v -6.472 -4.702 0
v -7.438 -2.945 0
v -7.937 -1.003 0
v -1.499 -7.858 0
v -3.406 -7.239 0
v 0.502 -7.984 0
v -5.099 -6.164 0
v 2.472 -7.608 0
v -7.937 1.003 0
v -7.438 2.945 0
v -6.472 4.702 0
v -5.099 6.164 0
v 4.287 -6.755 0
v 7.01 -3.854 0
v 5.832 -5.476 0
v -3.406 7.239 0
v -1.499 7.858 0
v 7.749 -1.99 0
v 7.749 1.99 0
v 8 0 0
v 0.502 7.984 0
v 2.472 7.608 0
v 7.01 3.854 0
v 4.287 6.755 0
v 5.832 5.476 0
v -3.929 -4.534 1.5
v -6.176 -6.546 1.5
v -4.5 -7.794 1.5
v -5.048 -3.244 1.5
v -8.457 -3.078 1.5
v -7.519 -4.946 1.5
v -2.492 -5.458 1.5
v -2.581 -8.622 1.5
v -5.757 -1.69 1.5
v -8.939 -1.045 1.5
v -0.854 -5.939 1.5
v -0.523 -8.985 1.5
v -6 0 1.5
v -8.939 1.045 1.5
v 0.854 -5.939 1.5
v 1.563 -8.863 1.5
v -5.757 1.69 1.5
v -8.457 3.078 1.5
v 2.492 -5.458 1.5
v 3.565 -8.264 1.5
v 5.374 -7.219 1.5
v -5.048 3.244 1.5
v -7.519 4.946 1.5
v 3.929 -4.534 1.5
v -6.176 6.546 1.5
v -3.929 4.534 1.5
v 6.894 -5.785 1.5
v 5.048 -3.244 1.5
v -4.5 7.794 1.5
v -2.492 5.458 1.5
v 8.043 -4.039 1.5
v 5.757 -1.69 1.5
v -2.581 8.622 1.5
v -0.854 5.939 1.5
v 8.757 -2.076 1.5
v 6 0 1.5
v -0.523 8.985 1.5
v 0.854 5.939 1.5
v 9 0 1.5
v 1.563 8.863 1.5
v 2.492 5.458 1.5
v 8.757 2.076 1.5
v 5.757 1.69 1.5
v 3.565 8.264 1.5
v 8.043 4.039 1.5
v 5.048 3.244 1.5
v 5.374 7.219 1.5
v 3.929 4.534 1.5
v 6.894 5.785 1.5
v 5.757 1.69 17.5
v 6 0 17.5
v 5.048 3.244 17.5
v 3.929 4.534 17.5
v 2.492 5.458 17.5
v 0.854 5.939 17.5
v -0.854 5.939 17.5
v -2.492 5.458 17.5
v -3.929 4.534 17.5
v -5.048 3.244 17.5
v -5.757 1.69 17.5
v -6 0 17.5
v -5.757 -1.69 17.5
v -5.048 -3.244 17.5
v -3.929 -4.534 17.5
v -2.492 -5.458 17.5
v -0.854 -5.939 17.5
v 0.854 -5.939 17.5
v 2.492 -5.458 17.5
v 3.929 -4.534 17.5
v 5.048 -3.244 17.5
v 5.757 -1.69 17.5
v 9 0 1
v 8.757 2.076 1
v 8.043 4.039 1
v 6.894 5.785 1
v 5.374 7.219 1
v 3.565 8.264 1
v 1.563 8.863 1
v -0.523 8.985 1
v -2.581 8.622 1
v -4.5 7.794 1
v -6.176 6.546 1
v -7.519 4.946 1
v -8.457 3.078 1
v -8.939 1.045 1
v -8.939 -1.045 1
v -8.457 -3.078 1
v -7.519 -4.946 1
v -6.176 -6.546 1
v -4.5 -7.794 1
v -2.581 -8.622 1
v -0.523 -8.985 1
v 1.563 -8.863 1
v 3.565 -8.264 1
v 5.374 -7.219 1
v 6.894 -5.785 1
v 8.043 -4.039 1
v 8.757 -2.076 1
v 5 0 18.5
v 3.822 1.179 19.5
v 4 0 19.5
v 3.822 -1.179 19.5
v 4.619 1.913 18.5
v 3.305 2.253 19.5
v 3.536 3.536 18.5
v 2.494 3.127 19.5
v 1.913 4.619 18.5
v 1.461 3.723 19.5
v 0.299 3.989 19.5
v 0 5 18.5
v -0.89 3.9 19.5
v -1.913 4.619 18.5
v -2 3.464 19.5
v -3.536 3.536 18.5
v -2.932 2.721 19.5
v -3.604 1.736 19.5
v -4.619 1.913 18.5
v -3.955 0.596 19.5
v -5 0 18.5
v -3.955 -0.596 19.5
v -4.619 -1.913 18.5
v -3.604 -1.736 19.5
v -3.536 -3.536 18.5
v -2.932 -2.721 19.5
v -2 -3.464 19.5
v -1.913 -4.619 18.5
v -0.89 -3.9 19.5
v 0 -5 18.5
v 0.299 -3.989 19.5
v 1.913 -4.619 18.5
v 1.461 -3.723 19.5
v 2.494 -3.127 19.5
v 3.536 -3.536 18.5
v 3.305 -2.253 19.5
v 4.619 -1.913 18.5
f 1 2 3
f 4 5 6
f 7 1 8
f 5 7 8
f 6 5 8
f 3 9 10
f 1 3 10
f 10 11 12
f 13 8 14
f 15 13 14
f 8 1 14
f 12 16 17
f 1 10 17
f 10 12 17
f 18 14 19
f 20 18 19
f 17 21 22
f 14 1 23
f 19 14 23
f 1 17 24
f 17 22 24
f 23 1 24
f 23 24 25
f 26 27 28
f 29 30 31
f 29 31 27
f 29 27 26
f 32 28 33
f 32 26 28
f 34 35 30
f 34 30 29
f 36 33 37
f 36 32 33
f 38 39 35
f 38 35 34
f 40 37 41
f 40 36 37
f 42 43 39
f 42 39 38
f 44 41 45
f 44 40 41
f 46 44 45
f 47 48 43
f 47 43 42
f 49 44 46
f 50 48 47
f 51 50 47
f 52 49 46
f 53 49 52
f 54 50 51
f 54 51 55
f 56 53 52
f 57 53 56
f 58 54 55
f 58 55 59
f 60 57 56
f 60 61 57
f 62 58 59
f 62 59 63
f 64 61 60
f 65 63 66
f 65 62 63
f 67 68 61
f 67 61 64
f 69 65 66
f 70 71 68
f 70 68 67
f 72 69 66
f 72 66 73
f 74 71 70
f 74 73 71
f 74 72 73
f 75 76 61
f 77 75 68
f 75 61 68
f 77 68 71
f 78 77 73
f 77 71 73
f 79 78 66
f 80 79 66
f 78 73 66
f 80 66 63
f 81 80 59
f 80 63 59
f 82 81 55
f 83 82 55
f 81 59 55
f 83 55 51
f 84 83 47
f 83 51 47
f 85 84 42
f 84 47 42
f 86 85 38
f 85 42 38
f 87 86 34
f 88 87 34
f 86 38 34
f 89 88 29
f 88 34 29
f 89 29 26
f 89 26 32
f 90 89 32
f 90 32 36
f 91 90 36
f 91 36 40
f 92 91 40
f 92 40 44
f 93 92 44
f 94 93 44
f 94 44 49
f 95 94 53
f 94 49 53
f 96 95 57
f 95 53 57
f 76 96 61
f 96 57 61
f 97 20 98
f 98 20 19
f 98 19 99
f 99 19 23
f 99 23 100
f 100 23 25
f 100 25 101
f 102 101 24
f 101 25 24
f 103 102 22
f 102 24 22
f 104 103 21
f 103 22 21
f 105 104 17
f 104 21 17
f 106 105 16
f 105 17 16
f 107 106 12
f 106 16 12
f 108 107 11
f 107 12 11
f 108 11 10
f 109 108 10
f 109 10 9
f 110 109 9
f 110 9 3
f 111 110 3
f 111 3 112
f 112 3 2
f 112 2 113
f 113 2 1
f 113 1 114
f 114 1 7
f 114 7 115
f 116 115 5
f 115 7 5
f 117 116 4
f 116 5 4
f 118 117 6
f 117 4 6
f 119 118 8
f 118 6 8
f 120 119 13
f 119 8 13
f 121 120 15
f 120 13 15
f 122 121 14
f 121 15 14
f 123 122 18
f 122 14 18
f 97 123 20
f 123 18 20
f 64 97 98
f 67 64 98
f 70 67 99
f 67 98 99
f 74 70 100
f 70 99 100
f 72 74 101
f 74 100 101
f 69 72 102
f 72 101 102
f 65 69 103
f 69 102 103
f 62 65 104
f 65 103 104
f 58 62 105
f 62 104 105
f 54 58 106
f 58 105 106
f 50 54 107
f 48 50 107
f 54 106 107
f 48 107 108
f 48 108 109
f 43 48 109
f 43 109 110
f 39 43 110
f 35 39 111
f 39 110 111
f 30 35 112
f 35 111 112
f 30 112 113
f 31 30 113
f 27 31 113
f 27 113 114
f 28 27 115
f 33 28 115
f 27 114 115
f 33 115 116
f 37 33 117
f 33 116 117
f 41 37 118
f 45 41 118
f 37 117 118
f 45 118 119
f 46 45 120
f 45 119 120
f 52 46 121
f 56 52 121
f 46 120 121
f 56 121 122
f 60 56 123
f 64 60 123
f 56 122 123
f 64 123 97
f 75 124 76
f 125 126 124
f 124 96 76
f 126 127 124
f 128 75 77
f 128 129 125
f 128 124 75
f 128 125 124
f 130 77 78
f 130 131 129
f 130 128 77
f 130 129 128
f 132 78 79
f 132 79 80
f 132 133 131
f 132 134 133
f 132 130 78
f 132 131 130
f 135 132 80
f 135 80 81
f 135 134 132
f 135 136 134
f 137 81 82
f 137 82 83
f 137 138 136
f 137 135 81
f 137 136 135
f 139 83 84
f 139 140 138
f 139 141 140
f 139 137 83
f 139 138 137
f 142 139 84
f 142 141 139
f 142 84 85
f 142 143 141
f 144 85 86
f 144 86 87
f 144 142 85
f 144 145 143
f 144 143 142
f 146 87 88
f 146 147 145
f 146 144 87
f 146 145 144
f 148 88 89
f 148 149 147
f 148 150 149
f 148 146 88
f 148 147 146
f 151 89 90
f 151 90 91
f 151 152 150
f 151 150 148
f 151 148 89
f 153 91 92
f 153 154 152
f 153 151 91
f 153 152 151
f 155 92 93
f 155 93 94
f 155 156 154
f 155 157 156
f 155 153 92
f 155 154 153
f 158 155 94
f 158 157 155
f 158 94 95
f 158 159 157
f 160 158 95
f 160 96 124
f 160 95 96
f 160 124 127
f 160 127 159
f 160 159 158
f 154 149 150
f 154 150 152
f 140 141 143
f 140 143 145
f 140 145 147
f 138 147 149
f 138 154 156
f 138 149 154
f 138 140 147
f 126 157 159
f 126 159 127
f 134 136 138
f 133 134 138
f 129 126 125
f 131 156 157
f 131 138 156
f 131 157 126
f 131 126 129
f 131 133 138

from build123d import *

# Parameters (mm, degrees)
SKETCH_R        = 9
PAD_DEPTH       = 1.5
SKETCH001_R     = 6
PAD001_DEPTH    = 18
CHAMFER_SIZE    = 1
CHAMFER001_SIZE = 2


with BuildPart() as part:
    # Sketch → Pad (new body)
    with BuildSketch(Plane.XY):
        Circle(SKETCH_R)
    extrude(amount=PAD_DEPTH)

    # Sketch001 (on Face3 of Pad) → Pad001 (join)
    with BuildSketch(Plane.XY.offset(1.5)):
        Circle(SKETCH001_R)
    extrude(amount=PAD001_DEPTH)

    # Chamfer
    chamfer_edges = [part.edges().sort_by_distance(p)[0] for p in [
        (-9, 0, 0),
    ]]
    chamfer(chamfer_edges, length=CHAMFER_SIZE)

    # Chamfer001
    chamfer001_edges = [part.edges().sort_by_distance(p)[0] for p in [
        (-6, 0, 19.5),
    ]]
    chamfer(chamfer001_edges, length=CHAMFER001_SIZE)


solid = part.part
